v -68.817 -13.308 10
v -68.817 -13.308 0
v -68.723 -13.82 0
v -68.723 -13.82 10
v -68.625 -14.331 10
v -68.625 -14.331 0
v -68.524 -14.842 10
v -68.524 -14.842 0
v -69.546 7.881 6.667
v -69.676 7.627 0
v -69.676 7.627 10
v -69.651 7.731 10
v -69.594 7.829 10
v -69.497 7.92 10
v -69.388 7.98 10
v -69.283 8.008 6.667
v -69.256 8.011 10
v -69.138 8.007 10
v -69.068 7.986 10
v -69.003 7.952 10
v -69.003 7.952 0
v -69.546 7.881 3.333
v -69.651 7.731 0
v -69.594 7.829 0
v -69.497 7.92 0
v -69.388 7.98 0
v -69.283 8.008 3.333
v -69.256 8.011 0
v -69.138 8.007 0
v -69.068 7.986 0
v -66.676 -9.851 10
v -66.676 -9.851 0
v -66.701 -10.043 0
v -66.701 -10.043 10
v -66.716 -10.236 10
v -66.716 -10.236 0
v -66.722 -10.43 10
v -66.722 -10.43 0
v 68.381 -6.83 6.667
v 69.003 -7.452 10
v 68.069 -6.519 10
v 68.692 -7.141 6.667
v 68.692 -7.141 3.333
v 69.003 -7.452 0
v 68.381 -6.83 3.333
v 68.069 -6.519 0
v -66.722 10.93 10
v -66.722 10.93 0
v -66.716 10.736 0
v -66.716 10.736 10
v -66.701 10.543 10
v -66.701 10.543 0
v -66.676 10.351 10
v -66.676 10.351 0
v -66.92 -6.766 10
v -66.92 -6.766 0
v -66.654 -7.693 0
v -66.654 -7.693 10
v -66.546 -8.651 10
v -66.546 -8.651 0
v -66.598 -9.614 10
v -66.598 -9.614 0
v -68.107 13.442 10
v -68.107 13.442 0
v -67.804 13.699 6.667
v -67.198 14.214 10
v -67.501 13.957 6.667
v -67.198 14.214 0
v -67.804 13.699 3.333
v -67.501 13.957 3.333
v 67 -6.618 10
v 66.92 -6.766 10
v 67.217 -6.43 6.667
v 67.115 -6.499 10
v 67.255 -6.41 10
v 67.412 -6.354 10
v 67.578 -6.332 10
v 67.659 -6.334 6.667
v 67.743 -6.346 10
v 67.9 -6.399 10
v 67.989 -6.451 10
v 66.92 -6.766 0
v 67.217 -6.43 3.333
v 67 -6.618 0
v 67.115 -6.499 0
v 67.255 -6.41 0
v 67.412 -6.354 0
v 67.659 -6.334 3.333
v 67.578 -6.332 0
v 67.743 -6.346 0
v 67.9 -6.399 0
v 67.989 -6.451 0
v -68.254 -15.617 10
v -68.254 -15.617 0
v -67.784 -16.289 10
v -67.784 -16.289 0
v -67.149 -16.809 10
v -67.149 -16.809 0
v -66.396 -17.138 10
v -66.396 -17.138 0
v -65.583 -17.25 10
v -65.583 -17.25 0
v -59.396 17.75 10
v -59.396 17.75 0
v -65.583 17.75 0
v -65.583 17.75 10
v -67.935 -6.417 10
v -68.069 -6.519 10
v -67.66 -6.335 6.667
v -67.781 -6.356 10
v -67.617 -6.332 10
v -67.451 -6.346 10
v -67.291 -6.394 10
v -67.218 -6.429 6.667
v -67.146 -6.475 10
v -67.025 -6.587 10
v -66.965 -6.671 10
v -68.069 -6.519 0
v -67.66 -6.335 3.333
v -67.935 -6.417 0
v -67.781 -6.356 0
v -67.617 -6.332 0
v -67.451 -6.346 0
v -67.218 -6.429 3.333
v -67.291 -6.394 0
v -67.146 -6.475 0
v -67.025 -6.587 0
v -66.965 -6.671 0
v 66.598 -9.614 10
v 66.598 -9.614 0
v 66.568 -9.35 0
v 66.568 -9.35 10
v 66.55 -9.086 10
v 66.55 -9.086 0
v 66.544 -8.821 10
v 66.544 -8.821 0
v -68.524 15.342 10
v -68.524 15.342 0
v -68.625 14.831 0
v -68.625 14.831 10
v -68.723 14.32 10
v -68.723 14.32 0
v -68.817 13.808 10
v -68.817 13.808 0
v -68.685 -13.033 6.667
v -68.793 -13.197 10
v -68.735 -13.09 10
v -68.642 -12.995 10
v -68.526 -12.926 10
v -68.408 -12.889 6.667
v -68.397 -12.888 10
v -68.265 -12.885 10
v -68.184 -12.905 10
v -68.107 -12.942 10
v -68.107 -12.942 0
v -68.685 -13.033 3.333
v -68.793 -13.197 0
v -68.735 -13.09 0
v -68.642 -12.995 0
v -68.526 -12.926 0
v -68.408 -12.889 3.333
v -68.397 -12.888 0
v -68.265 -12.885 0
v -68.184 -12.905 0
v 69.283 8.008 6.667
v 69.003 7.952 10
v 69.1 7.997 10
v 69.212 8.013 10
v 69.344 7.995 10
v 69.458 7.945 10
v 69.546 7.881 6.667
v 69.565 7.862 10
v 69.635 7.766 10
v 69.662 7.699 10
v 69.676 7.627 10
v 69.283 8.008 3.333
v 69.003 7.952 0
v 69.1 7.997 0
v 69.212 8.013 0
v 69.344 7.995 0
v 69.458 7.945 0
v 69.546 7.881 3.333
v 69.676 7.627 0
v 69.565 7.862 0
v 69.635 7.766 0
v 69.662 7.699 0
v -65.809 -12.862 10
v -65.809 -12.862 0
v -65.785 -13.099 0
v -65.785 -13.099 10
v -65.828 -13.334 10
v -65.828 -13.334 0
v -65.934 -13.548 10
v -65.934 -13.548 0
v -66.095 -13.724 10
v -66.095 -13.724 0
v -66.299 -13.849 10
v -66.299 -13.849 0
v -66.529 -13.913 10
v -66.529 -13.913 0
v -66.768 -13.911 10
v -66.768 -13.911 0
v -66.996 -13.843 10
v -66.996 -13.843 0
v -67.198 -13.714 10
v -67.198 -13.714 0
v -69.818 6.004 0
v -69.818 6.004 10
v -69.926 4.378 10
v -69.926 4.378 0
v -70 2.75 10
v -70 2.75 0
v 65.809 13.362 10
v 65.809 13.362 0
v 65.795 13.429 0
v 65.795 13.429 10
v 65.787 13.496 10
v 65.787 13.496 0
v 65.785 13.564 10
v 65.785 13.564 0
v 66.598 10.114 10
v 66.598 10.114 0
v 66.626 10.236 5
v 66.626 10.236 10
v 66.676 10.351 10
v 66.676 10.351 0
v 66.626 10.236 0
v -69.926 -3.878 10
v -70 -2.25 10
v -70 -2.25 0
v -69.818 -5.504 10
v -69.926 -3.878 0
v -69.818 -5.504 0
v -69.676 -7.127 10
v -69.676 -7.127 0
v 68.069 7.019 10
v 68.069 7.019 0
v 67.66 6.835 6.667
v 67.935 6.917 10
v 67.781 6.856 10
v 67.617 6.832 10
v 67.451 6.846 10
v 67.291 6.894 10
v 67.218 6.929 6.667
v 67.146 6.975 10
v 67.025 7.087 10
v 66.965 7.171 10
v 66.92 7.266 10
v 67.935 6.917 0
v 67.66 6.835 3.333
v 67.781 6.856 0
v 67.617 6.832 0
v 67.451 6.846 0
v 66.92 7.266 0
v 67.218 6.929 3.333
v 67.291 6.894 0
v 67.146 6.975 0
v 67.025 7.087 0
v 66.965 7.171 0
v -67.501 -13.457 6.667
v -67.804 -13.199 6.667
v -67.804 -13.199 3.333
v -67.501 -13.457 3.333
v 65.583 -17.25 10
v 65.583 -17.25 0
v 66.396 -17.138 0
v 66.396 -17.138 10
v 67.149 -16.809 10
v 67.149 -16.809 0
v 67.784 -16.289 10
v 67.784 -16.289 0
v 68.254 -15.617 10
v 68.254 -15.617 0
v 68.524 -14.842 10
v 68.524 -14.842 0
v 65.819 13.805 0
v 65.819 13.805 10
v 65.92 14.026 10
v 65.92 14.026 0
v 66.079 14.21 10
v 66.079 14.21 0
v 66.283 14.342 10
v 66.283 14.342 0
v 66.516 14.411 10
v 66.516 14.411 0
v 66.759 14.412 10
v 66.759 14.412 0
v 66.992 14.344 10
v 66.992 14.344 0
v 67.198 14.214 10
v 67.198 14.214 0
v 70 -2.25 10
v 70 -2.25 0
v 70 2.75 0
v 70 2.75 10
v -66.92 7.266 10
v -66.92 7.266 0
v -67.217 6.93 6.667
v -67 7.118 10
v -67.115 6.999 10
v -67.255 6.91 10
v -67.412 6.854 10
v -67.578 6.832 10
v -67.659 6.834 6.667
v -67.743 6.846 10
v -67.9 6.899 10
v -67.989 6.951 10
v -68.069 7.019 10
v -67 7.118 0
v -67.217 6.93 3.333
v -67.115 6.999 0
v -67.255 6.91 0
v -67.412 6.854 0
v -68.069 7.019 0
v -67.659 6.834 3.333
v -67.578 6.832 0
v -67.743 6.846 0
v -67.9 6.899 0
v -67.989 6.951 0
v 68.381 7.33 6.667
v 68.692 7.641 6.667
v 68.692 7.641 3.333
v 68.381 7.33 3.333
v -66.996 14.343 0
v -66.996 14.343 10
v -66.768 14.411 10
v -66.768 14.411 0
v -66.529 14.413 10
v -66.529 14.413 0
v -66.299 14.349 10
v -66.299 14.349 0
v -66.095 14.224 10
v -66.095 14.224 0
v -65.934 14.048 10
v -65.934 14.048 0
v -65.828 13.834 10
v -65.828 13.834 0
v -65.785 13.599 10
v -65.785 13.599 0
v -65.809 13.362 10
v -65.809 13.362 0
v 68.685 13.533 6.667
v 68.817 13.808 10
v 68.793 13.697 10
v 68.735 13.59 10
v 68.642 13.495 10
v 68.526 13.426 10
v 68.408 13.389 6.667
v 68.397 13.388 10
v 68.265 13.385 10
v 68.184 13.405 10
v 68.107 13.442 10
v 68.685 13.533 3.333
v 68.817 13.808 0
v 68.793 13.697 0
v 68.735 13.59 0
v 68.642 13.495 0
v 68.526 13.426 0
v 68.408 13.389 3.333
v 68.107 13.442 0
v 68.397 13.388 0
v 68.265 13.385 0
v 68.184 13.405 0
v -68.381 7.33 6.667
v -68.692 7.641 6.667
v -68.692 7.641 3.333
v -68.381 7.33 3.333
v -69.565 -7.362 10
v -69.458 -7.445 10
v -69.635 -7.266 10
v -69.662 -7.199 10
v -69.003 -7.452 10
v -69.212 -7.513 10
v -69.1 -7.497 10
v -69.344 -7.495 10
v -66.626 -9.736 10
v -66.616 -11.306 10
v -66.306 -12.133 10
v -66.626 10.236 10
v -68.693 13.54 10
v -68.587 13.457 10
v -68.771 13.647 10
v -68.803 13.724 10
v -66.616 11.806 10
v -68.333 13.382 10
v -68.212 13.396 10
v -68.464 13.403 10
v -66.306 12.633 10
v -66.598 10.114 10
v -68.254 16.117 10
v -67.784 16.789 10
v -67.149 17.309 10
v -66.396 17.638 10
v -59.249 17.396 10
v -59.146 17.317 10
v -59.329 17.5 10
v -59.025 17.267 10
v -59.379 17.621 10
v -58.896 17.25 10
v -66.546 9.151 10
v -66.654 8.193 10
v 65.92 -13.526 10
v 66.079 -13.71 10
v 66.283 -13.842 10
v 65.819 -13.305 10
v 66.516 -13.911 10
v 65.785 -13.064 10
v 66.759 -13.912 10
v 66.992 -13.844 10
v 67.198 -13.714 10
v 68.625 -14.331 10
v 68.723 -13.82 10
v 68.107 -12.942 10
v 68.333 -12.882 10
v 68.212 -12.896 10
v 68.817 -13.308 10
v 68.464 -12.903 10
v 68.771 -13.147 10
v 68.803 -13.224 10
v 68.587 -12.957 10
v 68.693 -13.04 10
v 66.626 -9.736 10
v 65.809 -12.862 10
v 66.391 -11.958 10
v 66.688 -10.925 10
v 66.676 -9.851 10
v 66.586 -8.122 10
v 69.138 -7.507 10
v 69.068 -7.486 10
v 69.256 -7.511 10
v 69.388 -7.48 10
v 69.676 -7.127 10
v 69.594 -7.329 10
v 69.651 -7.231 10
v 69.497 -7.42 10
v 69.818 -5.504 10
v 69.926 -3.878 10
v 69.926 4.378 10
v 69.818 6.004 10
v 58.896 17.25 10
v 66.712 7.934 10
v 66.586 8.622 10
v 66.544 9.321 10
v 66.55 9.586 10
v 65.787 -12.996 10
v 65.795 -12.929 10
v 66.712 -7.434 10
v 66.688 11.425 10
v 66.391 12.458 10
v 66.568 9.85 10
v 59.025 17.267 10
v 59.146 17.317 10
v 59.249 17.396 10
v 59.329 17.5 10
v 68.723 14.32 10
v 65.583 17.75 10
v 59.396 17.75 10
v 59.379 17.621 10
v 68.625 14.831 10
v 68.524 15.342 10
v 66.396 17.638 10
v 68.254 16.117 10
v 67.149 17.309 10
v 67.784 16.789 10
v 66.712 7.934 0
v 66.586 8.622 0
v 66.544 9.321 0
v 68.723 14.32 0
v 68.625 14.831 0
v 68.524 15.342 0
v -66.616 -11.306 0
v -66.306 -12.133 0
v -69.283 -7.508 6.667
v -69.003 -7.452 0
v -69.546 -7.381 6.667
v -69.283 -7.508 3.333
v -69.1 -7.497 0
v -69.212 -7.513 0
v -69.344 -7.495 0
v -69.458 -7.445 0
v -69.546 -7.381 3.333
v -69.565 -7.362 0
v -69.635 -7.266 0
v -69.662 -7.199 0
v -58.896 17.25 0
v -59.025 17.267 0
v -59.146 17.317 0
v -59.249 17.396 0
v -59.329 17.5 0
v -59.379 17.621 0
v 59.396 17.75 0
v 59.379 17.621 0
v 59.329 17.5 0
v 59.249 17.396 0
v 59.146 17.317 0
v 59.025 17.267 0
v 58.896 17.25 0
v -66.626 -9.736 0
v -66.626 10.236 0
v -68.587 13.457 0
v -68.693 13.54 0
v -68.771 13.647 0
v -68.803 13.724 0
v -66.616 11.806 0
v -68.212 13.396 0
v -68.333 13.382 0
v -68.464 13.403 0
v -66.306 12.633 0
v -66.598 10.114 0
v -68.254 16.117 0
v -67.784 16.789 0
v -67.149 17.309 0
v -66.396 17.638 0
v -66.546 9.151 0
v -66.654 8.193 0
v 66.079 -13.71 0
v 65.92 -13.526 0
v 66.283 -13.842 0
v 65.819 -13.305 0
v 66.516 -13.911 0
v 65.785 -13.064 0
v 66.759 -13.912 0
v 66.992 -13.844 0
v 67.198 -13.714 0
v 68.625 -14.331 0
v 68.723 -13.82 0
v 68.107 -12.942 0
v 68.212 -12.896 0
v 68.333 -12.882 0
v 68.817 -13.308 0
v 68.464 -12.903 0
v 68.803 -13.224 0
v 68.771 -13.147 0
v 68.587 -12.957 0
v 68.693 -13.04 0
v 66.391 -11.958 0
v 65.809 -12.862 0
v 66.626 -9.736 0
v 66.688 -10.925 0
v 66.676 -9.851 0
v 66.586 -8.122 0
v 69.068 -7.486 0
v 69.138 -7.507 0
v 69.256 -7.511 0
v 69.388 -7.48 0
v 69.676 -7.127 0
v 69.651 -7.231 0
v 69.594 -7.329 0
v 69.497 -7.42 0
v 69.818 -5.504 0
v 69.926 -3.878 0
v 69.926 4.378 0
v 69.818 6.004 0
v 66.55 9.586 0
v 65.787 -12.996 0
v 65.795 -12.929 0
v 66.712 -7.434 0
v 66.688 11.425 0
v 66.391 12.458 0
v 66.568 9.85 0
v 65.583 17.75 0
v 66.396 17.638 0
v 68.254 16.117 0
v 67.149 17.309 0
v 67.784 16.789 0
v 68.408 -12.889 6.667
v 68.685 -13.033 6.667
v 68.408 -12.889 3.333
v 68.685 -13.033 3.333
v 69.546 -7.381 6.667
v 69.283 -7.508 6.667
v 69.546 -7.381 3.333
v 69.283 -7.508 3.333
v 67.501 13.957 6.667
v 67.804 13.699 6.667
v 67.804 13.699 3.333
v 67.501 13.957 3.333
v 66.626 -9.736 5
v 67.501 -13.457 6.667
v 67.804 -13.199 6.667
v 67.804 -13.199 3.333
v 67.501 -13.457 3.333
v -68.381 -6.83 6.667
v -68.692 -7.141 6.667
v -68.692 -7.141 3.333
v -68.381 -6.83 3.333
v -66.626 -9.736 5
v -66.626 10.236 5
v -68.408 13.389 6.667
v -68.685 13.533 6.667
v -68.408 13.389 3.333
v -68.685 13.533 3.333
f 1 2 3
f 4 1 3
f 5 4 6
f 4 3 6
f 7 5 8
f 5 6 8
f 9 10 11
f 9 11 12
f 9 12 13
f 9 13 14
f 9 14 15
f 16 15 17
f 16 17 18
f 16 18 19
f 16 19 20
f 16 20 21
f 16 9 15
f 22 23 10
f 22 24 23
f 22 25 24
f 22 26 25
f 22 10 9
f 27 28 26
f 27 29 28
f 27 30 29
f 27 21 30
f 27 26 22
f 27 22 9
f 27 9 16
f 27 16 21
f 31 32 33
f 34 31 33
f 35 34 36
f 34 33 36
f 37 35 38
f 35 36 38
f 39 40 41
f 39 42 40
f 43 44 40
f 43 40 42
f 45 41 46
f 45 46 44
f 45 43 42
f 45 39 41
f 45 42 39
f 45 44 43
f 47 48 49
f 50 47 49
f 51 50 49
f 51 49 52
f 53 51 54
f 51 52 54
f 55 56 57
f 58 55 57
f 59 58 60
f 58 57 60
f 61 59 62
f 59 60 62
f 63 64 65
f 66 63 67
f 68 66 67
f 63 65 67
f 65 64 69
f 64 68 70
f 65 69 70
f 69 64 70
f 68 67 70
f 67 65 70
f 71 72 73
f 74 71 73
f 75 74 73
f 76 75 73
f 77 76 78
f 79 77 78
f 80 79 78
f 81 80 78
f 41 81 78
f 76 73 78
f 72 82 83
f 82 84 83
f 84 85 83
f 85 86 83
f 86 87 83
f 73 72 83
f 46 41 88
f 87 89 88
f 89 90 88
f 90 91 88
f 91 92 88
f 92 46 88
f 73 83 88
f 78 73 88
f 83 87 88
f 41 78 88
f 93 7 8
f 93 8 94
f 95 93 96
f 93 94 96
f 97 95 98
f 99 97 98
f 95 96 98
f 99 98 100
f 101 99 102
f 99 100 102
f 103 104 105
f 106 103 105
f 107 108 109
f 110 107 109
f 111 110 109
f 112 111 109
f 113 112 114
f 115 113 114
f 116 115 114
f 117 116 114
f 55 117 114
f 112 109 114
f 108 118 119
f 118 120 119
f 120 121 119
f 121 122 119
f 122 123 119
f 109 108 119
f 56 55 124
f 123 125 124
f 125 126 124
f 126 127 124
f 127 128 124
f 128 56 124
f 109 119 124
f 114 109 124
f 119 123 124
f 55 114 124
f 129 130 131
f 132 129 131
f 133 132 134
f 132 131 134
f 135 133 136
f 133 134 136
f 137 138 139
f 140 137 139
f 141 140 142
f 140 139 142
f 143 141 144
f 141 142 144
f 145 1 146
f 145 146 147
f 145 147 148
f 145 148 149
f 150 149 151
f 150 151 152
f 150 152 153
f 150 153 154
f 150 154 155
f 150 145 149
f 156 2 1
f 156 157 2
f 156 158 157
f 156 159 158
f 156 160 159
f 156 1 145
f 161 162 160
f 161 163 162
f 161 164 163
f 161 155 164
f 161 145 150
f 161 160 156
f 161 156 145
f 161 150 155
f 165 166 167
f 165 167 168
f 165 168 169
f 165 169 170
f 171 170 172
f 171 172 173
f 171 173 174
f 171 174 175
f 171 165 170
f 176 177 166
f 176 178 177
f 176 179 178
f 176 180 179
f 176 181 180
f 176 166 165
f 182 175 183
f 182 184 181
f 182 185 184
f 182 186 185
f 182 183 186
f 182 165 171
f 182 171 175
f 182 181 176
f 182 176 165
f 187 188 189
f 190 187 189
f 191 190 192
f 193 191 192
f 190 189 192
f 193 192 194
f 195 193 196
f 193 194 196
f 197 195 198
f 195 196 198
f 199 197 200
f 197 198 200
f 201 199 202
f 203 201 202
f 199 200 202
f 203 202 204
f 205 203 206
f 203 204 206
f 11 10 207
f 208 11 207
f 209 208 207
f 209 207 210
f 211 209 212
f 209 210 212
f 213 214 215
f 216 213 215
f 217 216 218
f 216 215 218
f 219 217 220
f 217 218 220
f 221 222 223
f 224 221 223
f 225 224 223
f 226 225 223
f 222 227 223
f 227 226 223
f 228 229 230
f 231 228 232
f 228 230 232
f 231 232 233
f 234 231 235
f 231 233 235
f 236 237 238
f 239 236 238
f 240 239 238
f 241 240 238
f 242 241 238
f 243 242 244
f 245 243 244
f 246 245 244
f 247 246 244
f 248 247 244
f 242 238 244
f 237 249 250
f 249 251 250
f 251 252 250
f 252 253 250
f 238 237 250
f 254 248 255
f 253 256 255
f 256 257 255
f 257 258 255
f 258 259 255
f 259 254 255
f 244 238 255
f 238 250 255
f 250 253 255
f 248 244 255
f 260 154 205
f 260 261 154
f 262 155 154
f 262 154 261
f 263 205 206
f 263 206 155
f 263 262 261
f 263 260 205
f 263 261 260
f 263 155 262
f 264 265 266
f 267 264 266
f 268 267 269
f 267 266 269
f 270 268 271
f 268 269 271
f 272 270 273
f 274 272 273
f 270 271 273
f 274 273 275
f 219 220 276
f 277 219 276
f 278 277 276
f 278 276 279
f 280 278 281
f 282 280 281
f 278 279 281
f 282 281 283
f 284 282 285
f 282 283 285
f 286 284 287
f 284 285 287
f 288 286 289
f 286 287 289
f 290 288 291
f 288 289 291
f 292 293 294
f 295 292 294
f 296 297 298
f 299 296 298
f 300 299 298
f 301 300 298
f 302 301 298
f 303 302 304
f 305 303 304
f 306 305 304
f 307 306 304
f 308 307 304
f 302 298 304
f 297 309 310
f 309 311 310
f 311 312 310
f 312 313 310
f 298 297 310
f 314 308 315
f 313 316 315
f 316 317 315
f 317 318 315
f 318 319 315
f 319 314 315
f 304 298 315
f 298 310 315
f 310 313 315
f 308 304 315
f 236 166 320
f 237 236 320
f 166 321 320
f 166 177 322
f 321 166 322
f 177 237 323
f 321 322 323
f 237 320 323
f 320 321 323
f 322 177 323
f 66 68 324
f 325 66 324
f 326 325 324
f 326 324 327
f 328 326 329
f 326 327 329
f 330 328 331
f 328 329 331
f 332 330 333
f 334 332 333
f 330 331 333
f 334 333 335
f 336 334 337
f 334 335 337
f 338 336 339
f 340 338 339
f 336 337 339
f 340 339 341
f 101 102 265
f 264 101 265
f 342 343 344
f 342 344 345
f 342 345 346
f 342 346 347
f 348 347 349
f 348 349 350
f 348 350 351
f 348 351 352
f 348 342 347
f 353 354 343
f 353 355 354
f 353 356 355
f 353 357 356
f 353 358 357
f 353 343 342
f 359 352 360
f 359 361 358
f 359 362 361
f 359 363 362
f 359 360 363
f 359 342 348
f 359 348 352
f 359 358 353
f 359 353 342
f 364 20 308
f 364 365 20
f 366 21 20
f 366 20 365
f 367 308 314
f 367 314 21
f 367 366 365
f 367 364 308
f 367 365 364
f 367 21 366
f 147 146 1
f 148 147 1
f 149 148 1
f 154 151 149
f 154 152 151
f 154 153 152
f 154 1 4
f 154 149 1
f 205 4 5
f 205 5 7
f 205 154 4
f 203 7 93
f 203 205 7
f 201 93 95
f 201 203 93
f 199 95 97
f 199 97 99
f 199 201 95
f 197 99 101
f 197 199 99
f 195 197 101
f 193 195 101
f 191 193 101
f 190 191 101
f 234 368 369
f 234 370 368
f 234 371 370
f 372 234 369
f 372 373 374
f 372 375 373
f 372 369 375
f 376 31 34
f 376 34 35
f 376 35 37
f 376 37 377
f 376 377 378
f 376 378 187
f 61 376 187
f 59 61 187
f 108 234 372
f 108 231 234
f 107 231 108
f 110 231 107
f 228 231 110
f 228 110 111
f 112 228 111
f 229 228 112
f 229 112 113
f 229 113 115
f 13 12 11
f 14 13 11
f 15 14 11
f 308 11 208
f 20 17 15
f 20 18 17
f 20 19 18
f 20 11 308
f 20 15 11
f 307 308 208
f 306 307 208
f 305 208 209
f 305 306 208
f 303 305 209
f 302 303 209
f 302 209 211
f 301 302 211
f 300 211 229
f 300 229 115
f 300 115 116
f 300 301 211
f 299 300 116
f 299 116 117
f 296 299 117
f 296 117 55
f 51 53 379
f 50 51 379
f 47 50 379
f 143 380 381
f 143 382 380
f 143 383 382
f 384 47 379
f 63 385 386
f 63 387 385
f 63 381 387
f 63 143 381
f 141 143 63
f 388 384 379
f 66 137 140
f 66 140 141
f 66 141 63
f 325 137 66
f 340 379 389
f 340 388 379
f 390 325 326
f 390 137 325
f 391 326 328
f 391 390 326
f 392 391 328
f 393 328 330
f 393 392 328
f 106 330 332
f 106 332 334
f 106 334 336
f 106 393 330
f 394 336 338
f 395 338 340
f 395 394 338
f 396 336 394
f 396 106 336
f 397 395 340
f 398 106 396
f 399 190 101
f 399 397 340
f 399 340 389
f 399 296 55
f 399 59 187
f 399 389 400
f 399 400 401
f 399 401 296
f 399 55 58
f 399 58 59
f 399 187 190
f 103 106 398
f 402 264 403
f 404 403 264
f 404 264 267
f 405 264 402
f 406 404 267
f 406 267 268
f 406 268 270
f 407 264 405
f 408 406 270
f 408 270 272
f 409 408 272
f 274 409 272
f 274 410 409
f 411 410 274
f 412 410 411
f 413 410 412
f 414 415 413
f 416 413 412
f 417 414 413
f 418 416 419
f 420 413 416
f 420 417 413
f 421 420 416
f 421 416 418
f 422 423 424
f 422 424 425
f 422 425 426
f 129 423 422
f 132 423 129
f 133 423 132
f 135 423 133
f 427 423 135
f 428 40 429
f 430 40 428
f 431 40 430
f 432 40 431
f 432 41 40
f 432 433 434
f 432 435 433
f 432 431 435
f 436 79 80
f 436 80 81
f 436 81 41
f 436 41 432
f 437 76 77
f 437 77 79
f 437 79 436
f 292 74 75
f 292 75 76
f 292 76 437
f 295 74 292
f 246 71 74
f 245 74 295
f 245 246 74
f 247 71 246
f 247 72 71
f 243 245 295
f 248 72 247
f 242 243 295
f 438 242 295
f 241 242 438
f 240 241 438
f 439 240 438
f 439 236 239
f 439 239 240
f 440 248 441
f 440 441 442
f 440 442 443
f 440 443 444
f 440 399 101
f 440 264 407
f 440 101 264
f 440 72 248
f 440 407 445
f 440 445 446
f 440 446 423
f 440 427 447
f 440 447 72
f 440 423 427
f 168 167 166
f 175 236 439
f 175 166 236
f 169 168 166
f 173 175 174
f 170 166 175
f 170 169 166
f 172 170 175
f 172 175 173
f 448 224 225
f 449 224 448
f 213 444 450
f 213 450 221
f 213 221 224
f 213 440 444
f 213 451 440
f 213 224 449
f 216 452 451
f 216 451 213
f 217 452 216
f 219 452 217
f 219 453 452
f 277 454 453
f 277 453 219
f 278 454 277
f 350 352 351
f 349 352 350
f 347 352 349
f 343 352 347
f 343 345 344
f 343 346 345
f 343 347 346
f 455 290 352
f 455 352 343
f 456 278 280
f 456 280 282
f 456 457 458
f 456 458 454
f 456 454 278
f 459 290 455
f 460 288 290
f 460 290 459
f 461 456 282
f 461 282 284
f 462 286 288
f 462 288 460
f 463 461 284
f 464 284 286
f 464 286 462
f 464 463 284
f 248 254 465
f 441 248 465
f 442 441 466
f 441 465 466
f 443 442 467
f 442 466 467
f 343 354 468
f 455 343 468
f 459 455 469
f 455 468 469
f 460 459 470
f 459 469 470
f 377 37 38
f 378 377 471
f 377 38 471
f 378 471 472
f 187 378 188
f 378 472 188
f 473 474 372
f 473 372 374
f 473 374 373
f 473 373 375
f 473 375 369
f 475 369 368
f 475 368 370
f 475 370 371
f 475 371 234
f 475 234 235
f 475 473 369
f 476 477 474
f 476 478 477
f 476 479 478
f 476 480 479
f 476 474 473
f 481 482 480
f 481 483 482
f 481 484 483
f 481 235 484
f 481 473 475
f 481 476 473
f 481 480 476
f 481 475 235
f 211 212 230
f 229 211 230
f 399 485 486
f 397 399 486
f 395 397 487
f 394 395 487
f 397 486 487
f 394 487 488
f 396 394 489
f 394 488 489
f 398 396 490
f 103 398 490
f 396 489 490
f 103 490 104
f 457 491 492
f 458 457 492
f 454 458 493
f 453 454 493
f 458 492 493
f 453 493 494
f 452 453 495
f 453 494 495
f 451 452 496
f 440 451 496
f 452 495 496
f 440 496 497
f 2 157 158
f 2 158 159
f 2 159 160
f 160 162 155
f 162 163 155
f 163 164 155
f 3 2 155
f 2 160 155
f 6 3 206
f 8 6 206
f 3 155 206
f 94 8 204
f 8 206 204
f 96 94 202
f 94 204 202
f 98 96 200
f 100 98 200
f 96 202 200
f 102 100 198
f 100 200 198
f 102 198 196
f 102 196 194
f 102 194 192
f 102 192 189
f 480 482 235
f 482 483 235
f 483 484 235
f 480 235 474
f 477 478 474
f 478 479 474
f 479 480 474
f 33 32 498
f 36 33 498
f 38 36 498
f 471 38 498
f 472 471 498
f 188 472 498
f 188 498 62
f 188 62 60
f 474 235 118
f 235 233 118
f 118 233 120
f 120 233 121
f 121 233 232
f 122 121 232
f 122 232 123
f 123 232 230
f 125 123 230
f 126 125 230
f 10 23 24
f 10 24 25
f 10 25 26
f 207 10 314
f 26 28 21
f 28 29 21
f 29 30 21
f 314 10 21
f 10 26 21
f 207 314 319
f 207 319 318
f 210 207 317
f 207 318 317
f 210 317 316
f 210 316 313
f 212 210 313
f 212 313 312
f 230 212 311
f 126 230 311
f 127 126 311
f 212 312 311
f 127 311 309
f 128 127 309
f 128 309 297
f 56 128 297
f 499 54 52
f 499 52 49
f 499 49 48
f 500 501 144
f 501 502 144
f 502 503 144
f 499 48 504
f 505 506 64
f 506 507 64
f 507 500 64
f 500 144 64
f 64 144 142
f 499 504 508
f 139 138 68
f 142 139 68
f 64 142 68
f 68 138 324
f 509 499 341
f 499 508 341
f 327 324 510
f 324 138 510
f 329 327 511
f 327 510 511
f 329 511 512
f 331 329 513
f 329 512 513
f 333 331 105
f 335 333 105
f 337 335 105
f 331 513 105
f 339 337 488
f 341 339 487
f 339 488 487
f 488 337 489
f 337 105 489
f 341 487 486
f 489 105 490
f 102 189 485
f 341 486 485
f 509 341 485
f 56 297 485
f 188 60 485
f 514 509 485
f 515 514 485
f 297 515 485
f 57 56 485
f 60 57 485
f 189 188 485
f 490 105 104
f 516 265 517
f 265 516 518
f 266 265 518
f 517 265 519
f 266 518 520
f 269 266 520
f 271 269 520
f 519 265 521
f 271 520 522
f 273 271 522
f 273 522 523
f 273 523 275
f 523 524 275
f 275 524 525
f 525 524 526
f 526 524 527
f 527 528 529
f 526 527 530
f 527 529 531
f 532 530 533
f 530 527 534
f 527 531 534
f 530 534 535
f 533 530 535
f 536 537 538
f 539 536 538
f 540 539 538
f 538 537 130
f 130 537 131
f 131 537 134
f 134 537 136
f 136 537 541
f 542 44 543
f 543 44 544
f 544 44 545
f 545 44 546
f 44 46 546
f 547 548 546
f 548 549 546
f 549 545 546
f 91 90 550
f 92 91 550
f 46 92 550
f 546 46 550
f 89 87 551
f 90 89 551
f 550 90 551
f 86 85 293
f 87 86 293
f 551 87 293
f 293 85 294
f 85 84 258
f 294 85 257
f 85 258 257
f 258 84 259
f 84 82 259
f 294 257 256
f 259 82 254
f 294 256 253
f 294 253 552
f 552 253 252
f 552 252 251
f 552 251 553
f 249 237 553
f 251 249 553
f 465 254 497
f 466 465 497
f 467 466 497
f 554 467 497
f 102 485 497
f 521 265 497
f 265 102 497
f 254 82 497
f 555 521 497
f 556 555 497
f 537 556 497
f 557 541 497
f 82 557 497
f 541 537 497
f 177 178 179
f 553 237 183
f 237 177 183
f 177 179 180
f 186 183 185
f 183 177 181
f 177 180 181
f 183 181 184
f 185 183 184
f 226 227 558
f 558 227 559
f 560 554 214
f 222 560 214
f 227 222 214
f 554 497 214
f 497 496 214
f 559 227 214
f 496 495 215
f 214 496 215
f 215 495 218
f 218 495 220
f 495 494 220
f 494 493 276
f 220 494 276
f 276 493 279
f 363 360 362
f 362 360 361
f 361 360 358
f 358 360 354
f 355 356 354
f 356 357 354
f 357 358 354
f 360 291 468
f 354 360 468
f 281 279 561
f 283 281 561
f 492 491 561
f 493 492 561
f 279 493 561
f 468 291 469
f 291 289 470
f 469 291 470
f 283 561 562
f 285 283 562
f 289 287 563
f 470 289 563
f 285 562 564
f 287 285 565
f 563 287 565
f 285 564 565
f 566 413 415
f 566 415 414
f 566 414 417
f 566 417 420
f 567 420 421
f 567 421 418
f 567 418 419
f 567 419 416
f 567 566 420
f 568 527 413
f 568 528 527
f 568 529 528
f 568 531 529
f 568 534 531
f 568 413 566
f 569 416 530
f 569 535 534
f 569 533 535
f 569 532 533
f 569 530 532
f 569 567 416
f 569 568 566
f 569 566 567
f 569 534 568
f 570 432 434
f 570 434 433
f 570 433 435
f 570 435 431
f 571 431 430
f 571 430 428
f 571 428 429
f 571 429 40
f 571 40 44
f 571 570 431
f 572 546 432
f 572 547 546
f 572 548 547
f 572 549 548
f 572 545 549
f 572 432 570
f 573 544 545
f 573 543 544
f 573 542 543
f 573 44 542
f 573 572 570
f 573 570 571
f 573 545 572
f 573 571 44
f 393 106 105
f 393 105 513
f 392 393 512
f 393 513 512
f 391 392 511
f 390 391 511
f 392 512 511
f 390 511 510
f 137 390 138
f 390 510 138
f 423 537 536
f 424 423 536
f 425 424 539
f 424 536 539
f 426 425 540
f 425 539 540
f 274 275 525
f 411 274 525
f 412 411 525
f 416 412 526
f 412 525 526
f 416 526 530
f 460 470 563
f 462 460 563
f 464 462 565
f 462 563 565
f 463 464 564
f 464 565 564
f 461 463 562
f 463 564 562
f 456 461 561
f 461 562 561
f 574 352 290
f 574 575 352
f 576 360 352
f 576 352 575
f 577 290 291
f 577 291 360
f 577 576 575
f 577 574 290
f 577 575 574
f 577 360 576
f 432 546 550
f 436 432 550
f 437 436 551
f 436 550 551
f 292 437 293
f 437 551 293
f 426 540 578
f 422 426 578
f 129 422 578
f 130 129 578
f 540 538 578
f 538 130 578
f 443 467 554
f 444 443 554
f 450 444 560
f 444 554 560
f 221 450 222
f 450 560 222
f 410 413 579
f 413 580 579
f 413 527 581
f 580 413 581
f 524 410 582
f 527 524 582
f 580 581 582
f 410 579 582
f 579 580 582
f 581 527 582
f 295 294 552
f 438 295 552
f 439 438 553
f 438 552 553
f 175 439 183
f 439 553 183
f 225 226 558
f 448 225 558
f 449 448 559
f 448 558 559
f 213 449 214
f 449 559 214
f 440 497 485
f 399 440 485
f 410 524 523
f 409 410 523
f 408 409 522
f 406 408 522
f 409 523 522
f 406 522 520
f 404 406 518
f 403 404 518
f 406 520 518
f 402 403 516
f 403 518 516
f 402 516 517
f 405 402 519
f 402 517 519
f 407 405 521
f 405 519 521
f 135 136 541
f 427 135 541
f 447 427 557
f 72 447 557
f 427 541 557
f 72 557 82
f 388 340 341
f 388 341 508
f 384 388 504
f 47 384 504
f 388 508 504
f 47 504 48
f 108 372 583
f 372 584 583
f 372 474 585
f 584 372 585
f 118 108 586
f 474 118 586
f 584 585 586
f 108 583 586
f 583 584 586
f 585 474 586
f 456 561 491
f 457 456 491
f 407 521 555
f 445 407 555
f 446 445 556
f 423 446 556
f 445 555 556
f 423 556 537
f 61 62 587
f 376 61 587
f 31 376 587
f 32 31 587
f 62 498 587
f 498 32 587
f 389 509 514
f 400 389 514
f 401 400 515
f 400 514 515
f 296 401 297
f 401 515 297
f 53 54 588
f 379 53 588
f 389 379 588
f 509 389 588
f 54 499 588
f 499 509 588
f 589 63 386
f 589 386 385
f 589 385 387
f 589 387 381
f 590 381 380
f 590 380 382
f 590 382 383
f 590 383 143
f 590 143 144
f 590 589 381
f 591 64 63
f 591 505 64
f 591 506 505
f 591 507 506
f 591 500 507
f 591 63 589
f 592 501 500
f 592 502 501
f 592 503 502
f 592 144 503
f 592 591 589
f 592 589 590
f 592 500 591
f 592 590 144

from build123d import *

# Parameters (mm, degrees)
BOSS_EXTRUDE1_DEPTH = 10


with BuildPart() as part:
    # Sketch4 → Boss-Extrude1 (new body)
    with BuildSketch(Plane(origin=(-596.752057113, -420.633982059, 0), x_dir=(1, 0, 0), z_dir=(0, 0, 1))):
        with BuildLine():
            ThreePointArc((537.856383508, 437.883981662), (537.502832434, 438.030428645), (537.356390004, 438.383981605))
            Line((537.356390004, 438.383981605), (531.168761831, 438.383981605))
            ThreePointArc((531.168761831, 438.383981605), (529.26806706, 437.705050192), (528.227666546, 435.975554529))
            ThreePointArc((528.227666546, 435.975554529), (528.077612298, 435.20961824), (527.93527456, 434.442210497))
            add(Edge.make_bspline(
                [(528.645043035, 434.075601683), (528.373422677, 433.904628447), (527.953061604, 434.121752875), (527.93527456, 434.442210497)],
                knots=[0, 0, 0, 0, 1, 1, 1, 1], degree=3))
            add(Edge.make_bspline(
                [(528.645043035, 434.075601683), (528.948206003, 434.333052007), (529.251368972, 434.590502331), (529.55453194, 434.847952656)],
                knots=[0, 0, 0, 0, 1, 1, 1, 1], degree=3))
            ThreePointArc((529.55453194, 434.847952656), (530.559263516, 434.927792658), (530.943234874, 433.995898908))
            ThreePointArc((530.943234874, 433.995898908), (530.266234445, 432.862780603), (530.030548766, 431.564035464))
            ThreePointArc((530.030548766, 431.564035464), (530.04199793, 431.273411596), (530.076251009, 430.984586316))
            add(Edge.make_bspline(
                [(530.076251009, 430.984586316), (530.136438997, 430.87310997), (530.153738674, 430.747609806)],
                knots=[0, 0, 0, 1, 1, 1], degree=2))
            ThreePointArc((530.153738674, 430.747609806), (530.171525682, 429.303646555), (529.832457882, 427.899944565))
            add(Edge.make_bspline(
                [(529.832457882, 427.899944565), (529.664786165, 427.456732189), (529.019825312, 427.315590122), (528.682762303, 427.652660836)],
                knots=[0, 0, 0, 0, 1, 1, 1, 1], degree=3))
            add(Edge.make_bspline(
                [(527.749025131, 428.586405192), (528.060270855, 428.275157074), (528.371516579, 427.963908955), (528.682762303, 427.652660836)],
                knots=[0, 0, 0, 0, 1, 1, 1, 1], degree=3))
            add(Edge.make_bspline(
                [(527.076105496, 428.261094814), (527.101664269, 428.559910263), (527.498966326, 428.751978492), (527.749025131, 428.586405192)],
                knots=[0, 0, 0, 0, 1, 1, 1, 1], degree=3))
            ThreePointArc((527.076105496, 428.261094814), (526.875645149, 425.825092413), (526.752056208, 423.383982457))
            Line((526.752056208, 423.383982457), (526.752056208, 418.383982457))
            ThreePointArc((526.752056208, 418.383982457), (526.875645149, 415.9428725), (527.076105496, 413.506870099))
            add(Edge.make_bspline(
                [(527.749025131, 413.181559721), (527.498966326, 413.015986421), (527.101664269, 413.20805465), (527.076105496, 413.506870099)],
                knots=[0, 0, 0, 0, 1, 1, 1, 1], degree=3))
            add(Edge.make_bspline(
                [(527.749025131, 413.181559721), (528.060270855, 413.492807839), (528.371516579, 413.804055958), (528.682763021, 414.115303358)],
                knots=[0, 0, 0, 0, 1, 1, 1, 1], degree=3))
            add(Edge.make_bspline(
                [(528.682763021, 414.115303358), (529.017832696, 414.450379772), (529.663792656, 414.313863986), (529.832459308, 413.868020888)],
                knots=[0, 0, 0, 0, 1, 1, 1, 1], degree=3))
            ThreePointArc((529.832459308, 413.868020888), (530.171527108, 412.464318898), (530.153740099, 411.020355646))
            add(Edge.make_bspline(
                [(530.153740099, 411.020355646), (530.136437403, 410.894855899), (530.076250924, 410.783379344)],
                knots=[0, 0, 0, 1, 1, 1], degree=2))
            ThreePointArc((530.076250924, 410.783379344), (530.041997846, 410.494554064), (530.030548681, 410.203930197))
            ThreePointArc((530.030548681, 410.203930197), (530.26623436, 408.905185058), (530.94323479, 407.772066752))
            ThreePointArc((530.94323479, 407.772066752), (530.559263583, 406.840182612), (529.554540169, 406.920012427))
            add(Edge.make_bspline(
                [(528.645032562, 407.692363435), (528.948201765, 407.434913099), (529.251370967, 407.177462763), (529.554540169, 406.920012427)],
                knots=[0, 0, 0, 0, 1, 1, 1, 1], degree=3))
            add(Edge.make_bspline(
                [(527.93527456, 407.325754416), (527.953065541, 407.64620576), (528.37341291, 407.863326434), (528.645032562, 407.692363435)],
                knots=[0, 0, 0, 0, 1, 1, 1, 1], degree=3))
            ThreePointArc((527.93527456, 407.325754416), (528.077612382, 406.558346229), (528.227666724, 405.792409498))
            ThreePointArc((528.227666724, 405.792409498), (529.268067244, 404.062913858), (531.168762002, 403.383982456))
            Line((531.168762002, 403.383982456), (537.00283853, 403.383982456))
            Line((537.00283853, 403.383982456), (538.002825655, 403.383982456))
            Line((538.002825655, 403.383982456), (655.501288571, 403.383982456))
            Line((655.501288571, 403.383982456), (656.501275696, 403.383982456))
            Line((656.501275696, 403.383982456), (662.335352383, 403.383982456))
            ThreePointArc((662.335352383, 403.383982456), (664.236047153, 404.062913868), (665.276447667, 405.79240953))
            ThreePointArc((665.276447667, 405.79240953), (665.426501922, 406.558345849), (665.568839666, 407.325753624))
            add(Edge.make_bspline(
                [(664.859071191, 407.692362438), (665.130691549, 407.863335674), (665.551052622, 407.646211246), (665.568839666, 407.325753624)],
                knots=[0, 0, 0, 0, 1, 1, 1, 1], degree=3))
            add(Edge.make_bspline(
                [(664.859071191, 407.692362438), (664.555908222, 407.434912114), (664.252745254, 407.17746179), (663.949582286, 406.920011465)],
                knots=[0, 0, 0, 0, 1, 1, 1, 1], degree=3))
            ThreePointArc((663.949582286, 406.920011465), (663.034925489, 406.792053361), (662.5365948, 407.569637347))
            ThreePointArc((662.5365948, 407.569637347), (662.542665938, 407.671579613), (662.560879352, 407.772065213))
            ThreePointArc((662.560879352, 407.772065213), (663.329283515, 409.181297278), (663.427863217, 410.783377805))
            add(Edge.make_bspline(
                [(663.427863217, 410.783377805), (663.367675229, 410.894854151), (663.350375552, 411.020354315)],
                knots=[0, 0, 0, 1, 1, 1], degree=2))
            ThreePointArc((663.350375552, 411.020354315), (663.309579069, 411.4158969), (663.295980241, 411.813305205))
            ThreePointArc((663.295980241, 411.813305205), (663.390671322, 412.857693016), (663.671656343, 413.868019556))
            add(Edge.make_bspline(
                [(663.671656343, 413.868019556), (663.83932806, 414.311231933), (664.484288913, 414.452373999), (664.821351923, 414.115303285)],
                knots=[0, 0, 0, 0, 1, 1, 1, 1], degree=3))
            add(Edge.make_bspline(
                [(665.755089095, 413.181558929), (665.443843371, 413.492807047), (665.132597647, 413.804055166), (664.821351923, 414.115303285)],
                knots=[0, 0, 0, 0, 1, 1, 1, 1], degree=3))
            add(Edge.make_bspline(
                [(666.42800873, 413.506869307), (666.402449957, 413.208053858), (666.005147899, 413.015985629), (665.755089095, 413.181558929)],
                knots=[0, 0, 0, 0, 1, 1, 1, 1], degree=3))
            ThreePointArc((666.42800873, 413.506869307), (666.628469077, 415.942871708), (666.752058017, 418.383981664))
            Line((666.752058017, 418.383981664), (666.752058017, 423.383981664))
            ThreePointArc((666.752058017, 423.383981664), (666.628469077, 425.825091621), (666.42800873, 428.261094022))
            add(Edge.make_bspline(
                [(665.755089095, 428.5864044), (666.0051479, 428.7519777), (666.402449957, 428.559909471), (666.42800873, 428.261094022)],
                knots=[0, 0, 0, 0, 1, 1, 1, 1], degree=3))
            add(Edge.make_bspline(
                [(665.755089095, 428.5864044), (665.443843371, 428.275156282), (665.132597647, 427.963908163), (664.821351205, 427.652660763)],
                knots=[0, 0, 0, 0, 1, 1, 1, 1], degree=3))
            add(Edge.make_bspline(
                [(664.821351205, 427.652660763), (664.486281529, 427.317584349), (663.84032157, 427.454100135), (663.671654918, 427.899943234)],
                knots=[0, 0, 0, 0, 1, 1, 1, 1], degree=3))
            ThreePointArc((663.671654918, 427.899943234), (663.390669906, 428.910269722), (663.295978816, 429.95465748))
            ThreePointArc((663.295978816, 429.95465748), (663.309578212, 430.352065799), (663.350374127, 430.747608475))
            add(Edge.make_bspline(
                [(663.350374127, 430.747608475), (663.367673803, 430.873108638), (663.427861792, 430.984584985)],
                knots=[0, 0, 0, 1, 1, 1], degree=2))
            ThreePointArc((663.427861792, 430.984584985), (663.329282089, 432.586665512), (662.560877926, 433.995897577))
            ThreePointArc((662.560877926, 433.995897577), (662.542666024, 434.096379128), (662.53659539, 434.198317163))
            ThreePointArc((662.53659539, 434.198317163), (663.034920482, 434.975898575), (663.949573523, 434.847951066))
            add(Edge.make_bspline(
                [(664.859081663, 434.075600686), (664.555912283, 434.333050813), (664.252742903, 434.590500939), (663.949573523, 434.847951066)],
                knots=[0, 0, 0, 0, 1, 1, 1, 1], degree=3))
            add(Edge.make_bspline(
                [(665.568839666, 434.442209705), (665.551048684, 434.121758361), (665.130701316, 433.904637687), (664.859081663, 434.075600686)],
                knots=[0, 0, 0, 0, 1, 1, 1, 1], degree=3))
            ThreePointArc((665.568839666, 434.442209705), (665.426501849, 435.209617861), (665.276447514, 435.975554561))
            ThreePointArc((665.276447514, 435.975554561), (664.236046994, 437.705050202), (662.335352236, 438.383981605))
            Line((662.335352236, 438.383981605), (656.147724221, 438.383981605))
            ThreePointArc((656.147724221, 438.383981605), (656.001281792, 438.030428645), (655.647730718, 437.883981662))
            Line((655.647730718, 437.883981662), (537.856383508, 437.883981662))
        make_face()
    extrude(amount=BOSS_EXTRUDE1_DEPTH)


solid = part.part
